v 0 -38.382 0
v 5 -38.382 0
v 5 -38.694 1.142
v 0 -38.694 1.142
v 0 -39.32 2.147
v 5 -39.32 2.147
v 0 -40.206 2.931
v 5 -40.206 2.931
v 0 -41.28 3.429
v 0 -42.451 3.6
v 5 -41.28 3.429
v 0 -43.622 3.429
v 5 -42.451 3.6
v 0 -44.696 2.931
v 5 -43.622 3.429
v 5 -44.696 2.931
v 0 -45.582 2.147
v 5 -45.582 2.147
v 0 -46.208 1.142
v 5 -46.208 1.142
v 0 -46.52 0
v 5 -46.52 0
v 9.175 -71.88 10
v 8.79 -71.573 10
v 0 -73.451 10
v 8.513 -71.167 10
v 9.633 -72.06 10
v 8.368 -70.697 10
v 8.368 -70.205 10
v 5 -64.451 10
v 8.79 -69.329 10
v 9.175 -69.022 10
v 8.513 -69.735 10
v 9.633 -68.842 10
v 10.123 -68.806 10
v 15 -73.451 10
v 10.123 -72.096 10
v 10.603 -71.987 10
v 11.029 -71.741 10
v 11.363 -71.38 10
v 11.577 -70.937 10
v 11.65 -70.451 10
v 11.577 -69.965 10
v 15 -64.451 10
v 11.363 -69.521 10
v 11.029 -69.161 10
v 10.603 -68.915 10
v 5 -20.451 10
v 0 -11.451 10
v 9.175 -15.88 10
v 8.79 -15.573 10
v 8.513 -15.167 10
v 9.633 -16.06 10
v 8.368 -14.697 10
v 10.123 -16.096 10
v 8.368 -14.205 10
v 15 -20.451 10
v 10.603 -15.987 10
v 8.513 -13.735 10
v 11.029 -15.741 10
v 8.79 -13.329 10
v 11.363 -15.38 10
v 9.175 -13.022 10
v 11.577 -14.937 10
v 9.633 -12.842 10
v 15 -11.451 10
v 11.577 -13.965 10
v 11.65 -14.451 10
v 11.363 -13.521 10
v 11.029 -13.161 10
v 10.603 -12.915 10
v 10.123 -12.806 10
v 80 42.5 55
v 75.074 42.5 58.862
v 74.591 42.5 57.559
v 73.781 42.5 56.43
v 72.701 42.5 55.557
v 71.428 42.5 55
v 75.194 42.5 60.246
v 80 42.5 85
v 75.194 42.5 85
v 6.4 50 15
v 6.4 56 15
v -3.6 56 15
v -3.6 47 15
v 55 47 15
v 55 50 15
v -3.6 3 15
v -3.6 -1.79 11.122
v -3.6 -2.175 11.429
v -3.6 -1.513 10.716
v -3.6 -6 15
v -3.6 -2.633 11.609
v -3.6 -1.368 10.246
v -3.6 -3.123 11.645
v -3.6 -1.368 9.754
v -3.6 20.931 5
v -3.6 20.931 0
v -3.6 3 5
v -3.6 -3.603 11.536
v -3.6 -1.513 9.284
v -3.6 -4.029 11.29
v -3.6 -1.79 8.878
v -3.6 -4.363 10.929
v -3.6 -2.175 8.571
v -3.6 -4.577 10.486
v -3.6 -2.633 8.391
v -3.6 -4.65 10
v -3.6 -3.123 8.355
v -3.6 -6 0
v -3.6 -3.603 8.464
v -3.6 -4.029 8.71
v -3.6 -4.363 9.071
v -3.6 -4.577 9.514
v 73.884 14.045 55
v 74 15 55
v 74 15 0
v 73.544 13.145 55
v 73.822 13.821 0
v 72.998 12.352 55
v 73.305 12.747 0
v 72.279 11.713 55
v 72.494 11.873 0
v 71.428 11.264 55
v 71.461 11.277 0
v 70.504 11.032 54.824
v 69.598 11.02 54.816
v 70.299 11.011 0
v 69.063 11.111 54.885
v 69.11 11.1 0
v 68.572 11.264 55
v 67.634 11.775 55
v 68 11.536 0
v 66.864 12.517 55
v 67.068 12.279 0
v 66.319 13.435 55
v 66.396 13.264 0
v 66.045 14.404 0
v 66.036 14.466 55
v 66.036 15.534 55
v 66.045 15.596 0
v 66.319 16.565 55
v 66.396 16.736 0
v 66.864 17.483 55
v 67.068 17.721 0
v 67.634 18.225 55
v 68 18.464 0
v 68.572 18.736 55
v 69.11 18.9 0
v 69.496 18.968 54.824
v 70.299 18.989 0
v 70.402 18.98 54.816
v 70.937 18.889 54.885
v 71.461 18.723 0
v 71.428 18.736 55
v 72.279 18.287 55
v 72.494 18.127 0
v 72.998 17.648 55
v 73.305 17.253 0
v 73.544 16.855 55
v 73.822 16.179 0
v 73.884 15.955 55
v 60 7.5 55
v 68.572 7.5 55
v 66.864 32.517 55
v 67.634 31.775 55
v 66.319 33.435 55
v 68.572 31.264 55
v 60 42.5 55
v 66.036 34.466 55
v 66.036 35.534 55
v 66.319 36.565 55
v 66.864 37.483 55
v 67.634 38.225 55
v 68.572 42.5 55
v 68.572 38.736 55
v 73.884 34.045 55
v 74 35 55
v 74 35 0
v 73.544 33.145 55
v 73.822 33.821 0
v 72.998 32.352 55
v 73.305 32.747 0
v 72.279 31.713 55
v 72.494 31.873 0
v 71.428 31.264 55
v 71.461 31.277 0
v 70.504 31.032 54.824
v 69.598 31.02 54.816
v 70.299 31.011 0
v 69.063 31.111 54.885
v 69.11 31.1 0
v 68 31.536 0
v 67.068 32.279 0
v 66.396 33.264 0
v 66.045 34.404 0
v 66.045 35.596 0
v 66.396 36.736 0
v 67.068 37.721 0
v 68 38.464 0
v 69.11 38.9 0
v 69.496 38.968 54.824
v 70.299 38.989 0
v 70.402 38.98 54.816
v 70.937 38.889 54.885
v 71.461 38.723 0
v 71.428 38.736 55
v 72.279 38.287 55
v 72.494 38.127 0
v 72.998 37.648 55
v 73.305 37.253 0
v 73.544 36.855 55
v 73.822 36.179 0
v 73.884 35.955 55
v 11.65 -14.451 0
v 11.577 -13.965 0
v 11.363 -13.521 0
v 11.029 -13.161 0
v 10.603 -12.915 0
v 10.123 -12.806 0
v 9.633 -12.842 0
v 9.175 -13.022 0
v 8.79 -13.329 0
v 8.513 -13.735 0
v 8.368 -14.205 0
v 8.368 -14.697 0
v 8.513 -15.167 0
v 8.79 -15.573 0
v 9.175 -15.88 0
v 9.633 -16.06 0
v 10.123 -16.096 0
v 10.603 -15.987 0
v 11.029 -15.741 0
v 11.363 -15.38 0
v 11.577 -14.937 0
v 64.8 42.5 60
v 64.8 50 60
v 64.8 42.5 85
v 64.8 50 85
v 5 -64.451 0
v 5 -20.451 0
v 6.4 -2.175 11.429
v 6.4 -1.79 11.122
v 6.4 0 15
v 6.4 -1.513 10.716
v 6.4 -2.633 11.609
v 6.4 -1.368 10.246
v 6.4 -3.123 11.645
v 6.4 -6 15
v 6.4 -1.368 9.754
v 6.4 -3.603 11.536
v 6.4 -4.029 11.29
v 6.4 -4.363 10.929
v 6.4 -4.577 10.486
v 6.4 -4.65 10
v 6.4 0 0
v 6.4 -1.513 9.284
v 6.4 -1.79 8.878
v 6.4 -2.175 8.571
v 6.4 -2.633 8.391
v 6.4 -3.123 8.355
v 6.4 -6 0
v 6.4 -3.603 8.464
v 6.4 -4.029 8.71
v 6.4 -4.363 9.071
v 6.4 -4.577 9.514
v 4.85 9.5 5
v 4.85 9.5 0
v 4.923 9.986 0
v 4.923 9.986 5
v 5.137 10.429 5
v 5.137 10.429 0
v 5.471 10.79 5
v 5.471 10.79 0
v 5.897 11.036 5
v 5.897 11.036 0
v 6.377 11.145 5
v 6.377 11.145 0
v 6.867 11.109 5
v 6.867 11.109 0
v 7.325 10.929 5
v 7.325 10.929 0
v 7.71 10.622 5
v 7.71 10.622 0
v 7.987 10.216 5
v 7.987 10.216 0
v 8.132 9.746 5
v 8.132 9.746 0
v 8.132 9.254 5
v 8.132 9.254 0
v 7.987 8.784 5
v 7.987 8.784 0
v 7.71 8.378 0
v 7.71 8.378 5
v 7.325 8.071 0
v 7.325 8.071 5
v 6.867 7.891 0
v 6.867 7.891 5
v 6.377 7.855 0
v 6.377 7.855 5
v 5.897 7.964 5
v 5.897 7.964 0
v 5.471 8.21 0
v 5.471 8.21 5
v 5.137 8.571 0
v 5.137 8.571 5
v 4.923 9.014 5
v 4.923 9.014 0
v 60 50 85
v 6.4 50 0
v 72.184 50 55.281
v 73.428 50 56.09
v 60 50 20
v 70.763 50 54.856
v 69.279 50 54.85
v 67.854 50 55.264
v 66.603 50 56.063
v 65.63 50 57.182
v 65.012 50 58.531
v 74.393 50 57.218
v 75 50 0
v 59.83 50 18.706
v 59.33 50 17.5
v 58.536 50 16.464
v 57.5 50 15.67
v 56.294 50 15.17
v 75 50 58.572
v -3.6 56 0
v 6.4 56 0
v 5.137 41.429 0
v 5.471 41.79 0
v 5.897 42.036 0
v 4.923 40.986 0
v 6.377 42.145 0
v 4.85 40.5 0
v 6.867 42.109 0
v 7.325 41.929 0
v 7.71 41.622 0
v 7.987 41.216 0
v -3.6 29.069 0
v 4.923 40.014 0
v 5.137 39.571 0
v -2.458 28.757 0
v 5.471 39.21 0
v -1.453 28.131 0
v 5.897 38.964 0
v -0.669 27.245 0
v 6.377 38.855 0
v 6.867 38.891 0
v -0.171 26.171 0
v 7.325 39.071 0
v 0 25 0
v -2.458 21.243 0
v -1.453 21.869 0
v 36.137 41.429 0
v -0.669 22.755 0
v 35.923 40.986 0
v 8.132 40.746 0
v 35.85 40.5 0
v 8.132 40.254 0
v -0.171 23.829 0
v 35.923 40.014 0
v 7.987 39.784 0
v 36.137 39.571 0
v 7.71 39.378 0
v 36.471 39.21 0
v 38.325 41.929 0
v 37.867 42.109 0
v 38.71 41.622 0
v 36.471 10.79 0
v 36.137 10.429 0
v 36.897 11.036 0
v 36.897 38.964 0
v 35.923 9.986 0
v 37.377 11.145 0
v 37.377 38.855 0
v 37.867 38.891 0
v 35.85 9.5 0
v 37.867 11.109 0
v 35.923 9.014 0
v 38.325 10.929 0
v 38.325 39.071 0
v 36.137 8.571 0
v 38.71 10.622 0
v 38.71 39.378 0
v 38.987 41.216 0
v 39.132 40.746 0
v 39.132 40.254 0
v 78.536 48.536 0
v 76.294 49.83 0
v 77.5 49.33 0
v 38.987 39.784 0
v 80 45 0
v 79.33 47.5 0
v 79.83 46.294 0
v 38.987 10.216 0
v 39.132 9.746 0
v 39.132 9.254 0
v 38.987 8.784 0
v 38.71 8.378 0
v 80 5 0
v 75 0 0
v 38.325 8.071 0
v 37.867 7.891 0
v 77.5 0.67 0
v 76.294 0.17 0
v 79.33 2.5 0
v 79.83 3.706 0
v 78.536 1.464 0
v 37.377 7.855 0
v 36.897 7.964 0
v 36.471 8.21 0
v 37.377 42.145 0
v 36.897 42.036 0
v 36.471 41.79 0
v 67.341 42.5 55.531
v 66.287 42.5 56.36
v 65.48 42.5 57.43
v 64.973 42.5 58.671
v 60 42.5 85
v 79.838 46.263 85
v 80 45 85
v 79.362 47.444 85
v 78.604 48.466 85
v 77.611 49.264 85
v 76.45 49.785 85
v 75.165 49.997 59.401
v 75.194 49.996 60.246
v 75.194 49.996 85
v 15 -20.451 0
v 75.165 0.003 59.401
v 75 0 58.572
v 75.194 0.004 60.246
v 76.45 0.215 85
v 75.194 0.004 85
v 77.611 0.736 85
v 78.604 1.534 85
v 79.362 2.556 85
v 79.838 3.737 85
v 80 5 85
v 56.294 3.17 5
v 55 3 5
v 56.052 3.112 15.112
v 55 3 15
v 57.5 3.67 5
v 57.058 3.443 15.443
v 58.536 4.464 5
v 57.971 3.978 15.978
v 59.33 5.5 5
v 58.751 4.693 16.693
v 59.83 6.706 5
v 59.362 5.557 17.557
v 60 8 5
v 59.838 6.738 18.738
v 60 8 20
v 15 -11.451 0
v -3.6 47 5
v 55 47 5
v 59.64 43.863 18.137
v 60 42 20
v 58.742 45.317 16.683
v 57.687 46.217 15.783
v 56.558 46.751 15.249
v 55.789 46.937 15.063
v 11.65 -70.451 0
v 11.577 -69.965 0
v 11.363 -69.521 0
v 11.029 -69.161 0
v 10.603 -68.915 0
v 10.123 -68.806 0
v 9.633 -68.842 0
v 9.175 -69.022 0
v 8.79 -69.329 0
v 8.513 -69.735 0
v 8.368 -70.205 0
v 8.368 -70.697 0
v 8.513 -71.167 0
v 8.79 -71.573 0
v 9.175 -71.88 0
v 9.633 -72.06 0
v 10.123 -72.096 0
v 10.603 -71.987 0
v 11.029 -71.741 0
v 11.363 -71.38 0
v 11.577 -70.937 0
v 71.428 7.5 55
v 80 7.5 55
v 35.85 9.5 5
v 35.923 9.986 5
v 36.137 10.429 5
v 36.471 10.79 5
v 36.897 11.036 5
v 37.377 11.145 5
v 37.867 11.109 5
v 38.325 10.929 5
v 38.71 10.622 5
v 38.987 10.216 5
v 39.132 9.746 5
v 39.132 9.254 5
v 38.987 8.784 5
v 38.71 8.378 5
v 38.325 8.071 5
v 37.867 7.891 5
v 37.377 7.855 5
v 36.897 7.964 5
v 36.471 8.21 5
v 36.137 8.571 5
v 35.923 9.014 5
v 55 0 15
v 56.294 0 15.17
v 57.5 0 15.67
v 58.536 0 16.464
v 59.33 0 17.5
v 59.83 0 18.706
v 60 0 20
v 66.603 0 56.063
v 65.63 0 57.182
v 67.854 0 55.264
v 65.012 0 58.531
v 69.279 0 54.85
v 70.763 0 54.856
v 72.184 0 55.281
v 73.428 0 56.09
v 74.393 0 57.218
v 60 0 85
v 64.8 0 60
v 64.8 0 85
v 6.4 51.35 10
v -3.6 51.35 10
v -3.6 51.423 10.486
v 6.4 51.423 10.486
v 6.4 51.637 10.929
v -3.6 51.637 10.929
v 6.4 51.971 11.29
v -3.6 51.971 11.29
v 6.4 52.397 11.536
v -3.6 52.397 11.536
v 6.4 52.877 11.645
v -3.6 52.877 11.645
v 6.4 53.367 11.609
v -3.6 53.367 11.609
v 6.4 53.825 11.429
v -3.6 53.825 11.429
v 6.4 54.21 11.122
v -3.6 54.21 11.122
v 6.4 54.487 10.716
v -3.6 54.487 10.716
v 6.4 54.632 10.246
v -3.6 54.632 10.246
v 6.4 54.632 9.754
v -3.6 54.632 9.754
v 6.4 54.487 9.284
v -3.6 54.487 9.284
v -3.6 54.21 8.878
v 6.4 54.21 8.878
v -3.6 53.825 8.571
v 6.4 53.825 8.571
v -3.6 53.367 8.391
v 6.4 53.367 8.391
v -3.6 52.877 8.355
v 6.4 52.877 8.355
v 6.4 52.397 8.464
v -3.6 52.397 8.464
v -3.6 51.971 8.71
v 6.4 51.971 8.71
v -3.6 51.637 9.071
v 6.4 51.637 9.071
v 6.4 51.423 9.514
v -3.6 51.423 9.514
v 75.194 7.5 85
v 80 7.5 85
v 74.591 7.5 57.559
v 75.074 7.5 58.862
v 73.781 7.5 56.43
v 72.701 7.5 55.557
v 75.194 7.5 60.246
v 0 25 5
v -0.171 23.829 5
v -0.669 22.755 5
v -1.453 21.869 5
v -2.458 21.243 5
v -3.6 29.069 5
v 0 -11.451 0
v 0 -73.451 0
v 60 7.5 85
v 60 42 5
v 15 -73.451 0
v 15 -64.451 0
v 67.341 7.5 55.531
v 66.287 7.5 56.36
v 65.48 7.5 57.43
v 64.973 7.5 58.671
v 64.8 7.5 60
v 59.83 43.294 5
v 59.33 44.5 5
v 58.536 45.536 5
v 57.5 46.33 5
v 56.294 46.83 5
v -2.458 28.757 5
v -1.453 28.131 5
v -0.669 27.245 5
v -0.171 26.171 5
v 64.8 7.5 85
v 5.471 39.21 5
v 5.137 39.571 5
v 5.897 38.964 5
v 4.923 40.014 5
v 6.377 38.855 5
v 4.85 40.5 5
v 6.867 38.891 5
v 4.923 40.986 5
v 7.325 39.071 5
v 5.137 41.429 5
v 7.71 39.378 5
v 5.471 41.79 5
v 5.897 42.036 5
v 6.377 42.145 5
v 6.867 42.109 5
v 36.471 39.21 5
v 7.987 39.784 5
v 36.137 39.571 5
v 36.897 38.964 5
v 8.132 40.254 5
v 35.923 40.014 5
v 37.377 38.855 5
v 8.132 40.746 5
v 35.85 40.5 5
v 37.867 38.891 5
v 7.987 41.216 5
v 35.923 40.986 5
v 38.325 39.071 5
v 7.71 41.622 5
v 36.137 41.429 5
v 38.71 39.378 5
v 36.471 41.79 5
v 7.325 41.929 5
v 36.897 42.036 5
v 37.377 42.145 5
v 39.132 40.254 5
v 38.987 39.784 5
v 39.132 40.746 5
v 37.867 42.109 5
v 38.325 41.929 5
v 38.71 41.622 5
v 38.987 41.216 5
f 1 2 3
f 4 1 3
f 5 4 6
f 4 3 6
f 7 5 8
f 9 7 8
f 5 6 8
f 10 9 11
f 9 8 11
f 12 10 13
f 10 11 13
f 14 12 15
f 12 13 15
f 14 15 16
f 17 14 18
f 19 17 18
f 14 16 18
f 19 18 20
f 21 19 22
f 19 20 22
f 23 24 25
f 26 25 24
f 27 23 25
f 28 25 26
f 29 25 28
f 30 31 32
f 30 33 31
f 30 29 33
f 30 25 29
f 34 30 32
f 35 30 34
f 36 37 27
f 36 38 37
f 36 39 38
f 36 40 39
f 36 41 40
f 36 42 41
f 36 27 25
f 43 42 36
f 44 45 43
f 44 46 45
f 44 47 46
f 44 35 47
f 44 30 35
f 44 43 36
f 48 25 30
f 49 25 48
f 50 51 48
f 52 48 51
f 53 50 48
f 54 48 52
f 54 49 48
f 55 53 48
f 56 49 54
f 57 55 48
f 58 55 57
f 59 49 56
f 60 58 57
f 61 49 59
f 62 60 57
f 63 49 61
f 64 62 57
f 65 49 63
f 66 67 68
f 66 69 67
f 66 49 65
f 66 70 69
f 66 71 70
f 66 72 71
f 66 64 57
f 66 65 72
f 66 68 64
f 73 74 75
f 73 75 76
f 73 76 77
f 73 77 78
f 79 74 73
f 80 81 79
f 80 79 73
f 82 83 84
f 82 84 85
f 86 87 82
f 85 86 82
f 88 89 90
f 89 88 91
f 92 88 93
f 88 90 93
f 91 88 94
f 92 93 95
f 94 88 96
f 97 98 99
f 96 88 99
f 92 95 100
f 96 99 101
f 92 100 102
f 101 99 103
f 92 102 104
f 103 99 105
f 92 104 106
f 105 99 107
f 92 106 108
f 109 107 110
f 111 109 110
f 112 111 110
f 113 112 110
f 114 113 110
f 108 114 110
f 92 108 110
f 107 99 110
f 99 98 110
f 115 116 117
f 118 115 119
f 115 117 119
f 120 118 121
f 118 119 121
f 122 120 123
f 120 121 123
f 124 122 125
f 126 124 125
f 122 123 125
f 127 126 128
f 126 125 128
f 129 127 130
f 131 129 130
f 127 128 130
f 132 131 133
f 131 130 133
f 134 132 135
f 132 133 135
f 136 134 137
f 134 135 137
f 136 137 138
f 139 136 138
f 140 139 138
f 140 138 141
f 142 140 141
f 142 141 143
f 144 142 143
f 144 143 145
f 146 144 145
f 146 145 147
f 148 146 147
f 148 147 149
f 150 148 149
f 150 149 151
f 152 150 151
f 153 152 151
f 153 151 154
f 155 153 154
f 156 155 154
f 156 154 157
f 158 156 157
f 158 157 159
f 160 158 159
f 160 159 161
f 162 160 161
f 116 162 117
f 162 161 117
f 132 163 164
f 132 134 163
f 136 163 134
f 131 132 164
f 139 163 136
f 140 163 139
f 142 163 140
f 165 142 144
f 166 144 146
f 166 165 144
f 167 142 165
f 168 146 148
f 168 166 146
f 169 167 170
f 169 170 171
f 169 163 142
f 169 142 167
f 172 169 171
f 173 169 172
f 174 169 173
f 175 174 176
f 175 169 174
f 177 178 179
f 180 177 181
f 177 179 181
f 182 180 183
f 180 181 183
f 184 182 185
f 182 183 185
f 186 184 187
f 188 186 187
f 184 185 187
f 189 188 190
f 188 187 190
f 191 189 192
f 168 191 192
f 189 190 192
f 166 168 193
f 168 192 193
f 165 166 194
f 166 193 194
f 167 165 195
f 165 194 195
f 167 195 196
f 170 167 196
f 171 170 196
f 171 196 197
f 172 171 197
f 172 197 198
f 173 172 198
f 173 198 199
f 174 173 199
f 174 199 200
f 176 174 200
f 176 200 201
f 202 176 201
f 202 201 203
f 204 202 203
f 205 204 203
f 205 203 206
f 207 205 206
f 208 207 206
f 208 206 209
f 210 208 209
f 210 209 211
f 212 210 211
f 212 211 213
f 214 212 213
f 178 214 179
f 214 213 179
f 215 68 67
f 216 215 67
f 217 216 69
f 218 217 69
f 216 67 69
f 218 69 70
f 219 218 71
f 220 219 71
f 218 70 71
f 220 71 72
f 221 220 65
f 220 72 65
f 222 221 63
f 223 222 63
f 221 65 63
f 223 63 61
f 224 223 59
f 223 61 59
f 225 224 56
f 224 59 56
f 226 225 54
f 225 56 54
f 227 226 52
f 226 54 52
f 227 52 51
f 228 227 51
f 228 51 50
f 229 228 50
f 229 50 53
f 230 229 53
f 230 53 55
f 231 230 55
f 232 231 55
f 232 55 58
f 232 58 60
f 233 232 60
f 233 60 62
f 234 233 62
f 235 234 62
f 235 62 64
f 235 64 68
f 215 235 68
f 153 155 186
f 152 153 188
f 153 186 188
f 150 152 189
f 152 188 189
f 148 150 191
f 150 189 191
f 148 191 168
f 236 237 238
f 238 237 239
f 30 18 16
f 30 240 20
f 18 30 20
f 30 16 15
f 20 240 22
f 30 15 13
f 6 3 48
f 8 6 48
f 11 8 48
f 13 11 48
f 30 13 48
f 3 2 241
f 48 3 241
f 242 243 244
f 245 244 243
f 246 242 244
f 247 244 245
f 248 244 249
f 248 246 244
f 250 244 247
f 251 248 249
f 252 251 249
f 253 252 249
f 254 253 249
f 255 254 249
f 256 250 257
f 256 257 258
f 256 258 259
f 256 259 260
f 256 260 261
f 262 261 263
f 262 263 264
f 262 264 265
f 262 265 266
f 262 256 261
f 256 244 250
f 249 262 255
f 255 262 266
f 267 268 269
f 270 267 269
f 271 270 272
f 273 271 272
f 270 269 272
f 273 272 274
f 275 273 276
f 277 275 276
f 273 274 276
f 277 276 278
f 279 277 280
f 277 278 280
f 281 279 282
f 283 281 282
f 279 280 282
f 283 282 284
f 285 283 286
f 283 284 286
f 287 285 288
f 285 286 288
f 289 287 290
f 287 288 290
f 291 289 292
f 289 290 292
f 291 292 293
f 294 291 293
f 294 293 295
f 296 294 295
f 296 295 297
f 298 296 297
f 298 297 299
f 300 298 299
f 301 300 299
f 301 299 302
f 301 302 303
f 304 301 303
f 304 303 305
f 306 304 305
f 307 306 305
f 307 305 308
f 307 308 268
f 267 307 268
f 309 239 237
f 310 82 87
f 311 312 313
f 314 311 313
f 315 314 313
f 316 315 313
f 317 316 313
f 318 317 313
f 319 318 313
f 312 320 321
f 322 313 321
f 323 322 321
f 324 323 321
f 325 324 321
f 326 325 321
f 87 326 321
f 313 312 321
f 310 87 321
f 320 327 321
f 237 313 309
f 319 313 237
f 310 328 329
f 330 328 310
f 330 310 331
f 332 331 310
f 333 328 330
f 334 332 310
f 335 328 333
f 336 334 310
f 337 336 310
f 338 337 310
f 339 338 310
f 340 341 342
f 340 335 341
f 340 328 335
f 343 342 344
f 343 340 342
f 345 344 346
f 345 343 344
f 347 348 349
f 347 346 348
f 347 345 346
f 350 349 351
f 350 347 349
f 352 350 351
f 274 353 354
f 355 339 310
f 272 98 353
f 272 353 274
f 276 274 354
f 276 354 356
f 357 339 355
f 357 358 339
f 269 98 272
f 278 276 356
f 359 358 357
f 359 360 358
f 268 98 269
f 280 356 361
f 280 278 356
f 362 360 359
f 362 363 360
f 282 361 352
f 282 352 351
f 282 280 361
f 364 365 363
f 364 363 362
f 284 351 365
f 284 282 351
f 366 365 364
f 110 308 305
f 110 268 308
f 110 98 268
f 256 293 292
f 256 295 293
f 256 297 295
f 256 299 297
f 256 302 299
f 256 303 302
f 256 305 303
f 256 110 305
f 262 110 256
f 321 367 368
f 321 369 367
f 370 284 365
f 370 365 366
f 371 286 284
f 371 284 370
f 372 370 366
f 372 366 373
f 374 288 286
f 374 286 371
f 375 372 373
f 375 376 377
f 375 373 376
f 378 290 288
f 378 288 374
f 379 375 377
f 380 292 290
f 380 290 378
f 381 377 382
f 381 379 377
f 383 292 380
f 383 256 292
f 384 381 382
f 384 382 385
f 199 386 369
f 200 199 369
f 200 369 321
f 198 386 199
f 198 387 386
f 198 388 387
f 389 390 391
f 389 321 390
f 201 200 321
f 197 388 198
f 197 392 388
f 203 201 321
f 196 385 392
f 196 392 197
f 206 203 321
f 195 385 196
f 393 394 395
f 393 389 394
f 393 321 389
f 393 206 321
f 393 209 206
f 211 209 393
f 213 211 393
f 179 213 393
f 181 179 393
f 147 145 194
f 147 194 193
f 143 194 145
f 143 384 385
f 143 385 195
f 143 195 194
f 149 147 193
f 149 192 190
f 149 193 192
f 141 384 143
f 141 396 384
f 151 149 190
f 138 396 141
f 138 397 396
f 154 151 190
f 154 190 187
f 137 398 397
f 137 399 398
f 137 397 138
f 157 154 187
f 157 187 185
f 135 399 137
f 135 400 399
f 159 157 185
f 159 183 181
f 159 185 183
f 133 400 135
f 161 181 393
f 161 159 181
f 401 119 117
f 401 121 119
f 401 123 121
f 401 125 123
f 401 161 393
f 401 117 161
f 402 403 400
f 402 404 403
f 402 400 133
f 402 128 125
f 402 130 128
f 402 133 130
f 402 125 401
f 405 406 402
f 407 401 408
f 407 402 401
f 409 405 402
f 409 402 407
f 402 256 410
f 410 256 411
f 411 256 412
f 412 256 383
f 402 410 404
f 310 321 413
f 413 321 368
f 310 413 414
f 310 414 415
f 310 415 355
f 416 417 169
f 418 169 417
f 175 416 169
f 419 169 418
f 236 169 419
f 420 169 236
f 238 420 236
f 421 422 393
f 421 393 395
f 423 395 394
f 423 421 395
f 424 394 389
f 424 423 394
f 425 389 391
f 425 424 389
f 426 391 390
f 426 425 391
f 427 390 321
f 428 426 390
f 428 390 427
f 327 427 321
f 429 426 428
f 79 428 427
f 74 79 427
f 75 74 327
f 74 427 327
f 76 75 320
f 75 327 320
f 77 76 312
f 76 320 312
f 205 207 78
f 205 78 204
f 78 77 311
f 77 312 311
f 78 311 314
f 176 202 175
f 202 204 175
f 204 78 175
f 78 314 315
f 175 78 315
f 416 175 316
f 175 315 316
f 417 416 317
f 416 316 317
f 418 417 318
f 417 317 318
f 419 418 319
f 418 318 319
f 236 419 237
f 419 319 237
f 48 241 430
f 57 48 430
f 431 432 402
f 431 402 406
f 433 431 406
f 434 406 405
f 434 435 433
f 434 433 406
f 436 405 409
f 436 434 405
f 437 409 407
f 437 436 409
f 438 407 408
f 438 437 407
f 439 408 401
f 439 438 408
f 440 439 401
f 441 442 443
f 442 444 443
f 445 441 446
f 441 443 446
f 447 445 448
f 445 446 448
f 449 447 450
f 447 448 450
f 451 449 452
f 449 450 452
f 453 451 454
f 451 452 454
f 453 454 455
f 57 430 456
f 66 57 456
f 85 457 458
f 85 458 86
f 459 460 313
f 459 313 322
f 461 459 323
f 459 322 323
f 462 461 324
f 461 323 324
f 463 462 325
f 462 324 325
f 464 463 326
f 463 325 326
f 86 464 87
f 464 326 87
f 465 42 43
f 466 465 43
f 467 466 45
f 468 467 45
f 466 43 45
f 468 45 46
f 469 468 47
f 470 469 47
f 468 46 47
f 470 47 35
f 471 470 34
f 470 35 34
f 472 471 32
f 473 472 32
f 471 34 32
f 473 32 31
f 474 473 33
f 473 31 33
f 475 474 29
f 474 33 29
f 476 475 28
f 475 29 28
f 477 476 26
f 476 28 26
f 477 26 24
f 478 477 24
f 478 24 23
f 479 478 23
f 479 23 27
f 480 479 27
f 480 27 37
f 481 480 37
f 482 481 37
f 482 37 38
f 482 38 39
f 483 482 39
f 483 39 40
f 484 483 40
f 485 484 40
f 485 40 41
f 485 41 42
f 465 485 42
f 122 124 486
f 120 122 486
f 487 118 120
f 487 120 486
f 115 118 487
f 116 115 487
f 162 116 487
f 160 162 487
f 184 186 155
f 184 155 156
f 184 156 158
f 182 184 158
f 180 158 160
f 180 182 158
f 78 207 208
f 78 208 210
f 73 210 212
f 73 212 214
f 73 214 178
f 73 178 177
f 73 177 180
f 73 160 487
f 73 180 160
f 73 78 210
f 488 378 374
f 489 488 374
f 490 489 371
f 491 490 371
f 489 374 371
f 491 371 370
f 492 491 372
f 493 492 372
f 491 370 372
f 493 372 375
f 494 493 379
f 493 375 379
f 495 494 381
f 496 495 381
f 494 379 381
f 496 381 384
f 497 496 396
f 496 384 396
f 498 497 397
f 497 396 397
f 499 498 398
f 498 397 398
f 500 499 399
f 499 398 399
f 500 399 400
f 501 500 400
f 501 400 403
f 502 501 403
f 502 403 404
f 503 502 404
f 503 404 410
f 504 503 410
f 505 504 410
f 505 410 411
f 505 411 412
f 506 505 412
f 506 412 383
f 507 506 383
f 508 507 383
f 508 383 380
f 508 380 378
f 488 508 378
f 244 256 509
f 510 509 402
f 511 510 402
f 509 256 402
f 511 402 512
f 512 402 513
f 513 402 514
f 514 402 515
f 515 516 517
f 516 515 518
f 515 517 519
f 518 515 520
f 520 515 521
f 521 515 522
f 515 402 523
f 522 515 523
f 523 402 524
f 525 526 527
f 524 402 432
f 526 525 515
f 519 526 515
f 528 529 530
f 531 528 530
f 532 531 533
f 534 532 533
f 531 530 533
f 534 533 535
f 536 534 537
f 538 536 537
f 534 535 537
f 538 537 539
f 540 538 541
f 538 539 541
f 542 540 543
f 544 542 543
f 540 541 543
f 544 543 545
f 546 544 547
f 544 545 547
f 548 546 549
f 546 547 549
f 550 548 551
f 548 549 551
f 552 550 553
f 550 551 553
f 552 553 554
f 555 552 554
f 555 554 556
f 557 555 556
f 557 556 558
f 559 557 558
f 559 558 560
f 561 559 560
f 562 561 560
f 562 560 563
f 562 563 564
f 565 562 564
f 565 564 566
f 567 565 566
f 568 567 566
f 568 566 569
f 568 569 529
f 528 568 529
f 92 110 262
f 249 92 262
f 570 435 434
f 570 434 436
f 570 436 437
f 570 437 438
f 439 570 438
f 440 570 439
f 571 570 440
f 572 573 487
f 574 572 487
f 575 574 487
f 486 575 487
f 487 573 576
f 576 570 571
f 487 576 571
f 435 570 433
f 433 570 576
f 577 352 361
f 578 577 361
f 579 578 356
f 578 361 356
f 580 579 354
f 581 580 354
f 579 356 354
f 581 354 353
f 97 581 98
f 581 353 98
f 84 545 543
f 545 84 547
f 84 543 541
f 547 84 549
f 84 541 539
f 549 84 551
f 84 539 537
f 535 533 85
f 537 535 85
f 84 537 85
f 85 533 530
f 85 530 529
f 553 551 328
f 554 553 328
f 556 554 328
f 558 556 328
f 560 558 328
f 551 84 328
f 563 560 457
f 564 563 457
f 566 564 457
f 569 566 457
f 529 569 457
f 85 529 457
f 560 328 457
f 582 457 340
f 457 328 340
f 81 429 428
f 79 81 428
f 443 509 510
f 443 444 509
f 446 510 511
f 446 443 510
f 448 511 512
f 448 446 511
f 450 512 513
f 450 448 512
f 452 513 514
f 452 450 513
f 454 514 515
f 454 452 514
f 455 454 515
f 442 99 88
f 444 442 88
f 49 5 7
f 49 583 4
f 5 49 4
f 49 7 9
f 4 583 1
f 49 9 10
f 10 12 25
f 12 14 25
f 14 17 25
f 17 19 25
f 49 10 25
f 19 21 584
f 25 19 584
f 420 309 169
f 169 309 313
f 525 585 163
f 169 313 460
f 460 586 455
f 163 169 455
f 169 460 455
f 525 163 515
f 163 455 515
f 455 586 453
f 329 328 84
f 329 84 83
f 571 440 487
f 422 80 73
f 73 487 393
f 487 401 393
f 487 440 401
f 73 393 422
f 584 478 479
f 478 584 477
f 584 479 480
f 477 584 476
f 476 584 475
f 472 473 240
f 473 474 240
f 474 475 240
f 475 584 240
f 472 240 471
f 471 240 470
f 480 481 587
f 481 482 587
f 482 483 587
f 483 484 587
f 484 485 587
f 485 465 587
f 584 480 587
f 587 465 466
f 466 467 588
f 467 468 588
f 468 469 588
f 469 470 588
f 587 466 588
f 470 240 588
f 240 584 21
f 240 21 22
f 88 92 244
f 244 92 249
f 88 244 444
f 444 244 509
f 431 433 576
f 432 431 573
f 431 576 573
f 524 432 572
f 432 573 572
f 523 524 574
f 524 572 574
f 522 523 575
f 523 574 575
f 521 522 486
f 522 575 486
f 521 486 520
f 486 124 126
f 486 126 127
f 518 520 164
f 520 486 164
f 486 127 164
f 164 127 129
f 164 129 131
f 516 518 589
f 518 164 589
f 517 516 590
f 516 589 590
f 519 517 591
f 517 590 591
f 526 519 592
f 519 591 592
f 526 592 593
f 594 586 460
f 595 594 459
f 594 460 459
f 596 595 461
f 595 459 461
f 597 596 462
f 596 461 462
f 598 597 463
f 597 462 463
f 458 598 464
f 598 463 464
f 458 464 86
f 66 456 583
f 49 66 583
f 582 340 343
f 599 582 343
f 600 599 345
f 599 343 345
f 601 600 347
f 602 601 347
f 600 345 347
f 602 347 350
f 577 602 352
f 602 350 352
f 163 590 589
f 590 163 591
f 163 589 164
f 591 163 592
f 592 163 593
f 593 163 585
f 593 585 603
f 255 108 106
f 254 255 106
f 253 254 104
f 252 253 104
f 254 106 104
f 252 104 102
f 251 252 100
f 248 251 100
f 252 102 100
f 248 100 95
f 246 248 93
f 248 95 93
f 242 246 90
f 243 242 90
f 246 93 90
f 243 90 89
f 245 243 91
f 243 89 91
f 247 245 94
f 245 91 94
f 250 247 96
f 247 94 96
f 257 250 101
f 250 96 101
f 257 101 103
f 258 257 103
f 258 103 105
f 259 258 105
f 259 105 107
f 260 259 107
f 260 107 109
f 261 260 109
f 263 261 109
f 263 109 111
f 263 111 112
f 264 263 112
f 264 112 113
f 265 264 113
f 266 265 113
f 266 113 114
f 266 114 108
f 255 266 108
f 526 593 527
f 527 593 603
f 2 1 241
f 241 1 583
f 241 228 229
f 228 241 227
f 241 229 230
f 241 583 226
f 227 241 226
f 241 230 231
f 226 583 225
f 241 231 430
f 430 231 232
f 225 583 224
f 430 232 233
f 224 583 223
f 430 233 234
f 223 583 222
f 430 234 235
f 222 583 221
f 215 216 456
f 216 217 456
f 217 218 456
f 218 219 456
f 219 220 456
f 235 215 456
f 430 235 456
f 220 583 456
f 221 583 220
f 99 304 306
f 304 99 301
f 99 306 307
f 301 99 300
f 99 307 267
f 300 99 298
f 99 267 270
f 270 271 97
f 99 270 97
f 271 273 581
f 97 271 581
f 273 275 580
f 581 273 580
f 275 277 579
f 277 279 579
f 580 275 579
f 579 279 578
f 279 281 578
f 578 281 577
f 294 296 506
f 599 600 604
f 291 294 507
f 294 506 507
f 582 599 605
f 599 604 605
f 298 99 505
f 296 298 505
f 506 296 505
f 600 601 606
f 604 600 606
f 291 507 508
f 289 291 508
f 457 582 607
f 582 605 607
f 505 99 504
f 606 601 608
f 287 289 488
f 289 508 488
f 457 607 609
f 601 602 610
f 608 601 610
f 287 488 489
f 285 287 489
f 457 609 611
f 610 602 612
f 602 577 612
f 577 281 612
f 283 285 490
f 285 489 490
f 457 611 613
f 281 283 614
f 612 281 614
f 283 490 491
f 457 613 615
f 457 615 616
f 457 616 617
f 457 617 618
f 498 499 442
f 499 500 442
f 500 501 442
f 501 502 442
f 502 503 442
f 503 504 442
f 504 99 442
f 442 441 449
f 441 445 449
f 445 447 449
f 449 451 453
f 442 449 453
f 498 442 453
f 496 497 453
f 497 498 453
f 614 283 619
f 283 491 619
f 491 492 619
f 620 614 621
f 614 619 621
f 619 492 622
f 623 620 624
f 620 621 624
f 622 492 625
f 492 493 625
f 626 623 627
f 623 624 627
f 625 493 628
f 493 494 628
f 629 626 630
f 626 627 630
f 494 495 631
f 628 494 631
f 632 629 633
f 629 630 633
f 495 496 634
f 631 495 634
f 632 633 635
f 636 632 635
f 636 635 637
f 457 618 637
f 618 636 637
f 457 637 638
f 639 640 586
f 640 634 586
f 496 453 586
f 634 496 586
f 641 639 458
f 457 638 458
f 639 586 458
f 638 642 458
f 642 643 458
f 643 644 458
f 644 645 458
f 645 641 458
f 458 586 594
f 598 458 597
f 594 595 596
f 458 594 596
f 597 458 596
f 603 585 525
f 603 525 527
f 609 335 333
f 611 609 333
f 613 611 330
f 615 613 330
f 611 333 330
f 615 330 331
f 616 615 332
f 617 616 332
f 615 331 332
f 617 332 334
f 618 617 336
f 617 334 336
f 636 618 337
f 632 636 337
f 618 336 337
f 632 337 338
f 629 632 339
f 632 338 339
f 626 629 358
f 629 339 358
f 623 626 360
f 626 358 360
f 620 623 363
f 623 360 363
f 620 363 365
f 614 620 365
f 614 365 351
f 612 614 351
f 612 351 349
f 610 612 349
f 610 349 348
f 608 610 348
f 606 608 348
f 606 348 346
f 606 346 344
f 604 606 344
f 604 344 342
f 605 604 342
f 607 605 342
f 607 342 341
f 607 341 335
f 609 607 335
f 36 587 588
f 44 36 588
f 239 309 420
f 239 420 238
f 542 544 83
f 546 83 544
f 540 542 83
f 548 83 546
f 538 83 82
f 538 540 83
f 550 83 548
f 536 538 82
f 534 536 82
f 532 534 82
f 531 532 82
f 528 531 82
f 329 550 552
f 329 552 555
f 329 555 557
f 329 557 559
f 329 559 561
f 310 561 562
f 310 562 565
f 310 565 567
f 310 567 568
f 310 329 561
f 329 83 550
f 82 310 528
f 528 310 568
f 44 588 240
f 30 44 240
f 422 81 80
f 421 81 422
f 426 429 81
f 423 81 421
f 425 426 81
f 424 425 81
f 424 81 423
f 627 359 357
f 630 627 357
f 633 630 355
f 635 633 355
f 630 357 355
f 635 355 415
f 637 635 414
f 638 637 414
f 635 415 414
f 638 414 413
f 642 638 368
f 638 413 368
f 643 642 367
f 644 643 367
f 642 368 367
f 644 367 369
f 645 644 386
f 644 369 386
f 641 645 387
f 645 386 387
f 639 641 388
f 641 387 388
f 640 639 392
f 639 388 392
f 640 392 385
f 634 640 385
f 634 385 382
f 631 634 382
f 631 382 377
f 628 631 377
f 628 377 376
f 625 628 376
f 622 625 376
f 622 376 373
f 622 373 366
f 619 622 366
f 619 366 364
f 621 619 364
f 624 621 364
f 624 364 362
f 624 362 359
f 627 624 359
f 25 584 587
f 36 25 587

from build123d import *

# Parameters (mm, degrees)
F0_W      = 80
F0_H      = 50
F1_DEPTH  = 5
F3_DEPTH  = 10
F2_W      = 17
F2_H      = 44
F4_DEPTH  = 80
F5_D      = 3.3
F6_DEPTH  = 3.6
F8_DEPTH  = 25
F7_W      = 10
F7_H      = 6
F9_DEPTH  = 15
F10_R     = 1.65
F11_DEPTH = 25
F13_DEPTH = 10
F15_DEPTH = 25
F16_R     = 1.65
F17_DEPTH = 25
F19_W     = 20
F19_H     = 35
F20_DEPTH = 30
F21_DEPTH = 80
F22_R     = 4
F23_DEPTH = 60
F24_R     = 5


with BuildPart() as f1:
    # F0 (on Top) → F1 (new body)
    with BuildSketch(Plane.XY):
        with Locations((40, 25)):
            Rectangle(F0_W, F0_H)
    extrude(amount=F1_DEPTH)

    # F2 (on face) → F3 (join)
    with BuildSketch(Plane.XY.offset(5)):
        Polygon((0, 47), (3, 47), (60, 47), (60, 50), (0, 50), align=None)
        Polygon((60, 0), (60, 3), (3, 3), (0, 3), (0, 0), align=None)
    extrude(amount=F3_DEPTH)

    # F2 (on face) → F4 (join)
    with BuildSketch(Plane.XY.offset(5)):
        with Locations((68.5, 25)):
            Rectangle(F2_W, F2_H)
        Polygon((60, 50), (60, 47), (77, 47), (77, 3), (60, 3), (60, 0), (80, 0), (80, 50), align=None)
    extrude(amount=F4_DEPTH)

    # F5 (through all)
    with Locations(Plane.XY.offset(5)):
        with Locations((37.5, 40.5), (37.5, 9.5), (6.5, 9.5), (6.5, 40.5)):
            Hole(F5_D / 2)

    # F6 (add): a face of the model
    f6_faces = [f1.faces().sort_by_distance(p)[0] for p in [
        (0, 25, 3.9516129032),
    ]]
    extrude(f6_faces, amount=F6_DEPTH)

    # F7 (on face) → F8 (cut)
    with BuildSketch(Plane(origin=(0, 0, 0), x_dir=(1, 0, 0), z_dir=(0, 0, -1))):
        with BuildLine():
            ThreePointArc((-3.6, -29.0693979899), (-1.0291694934, -27.7166155414), (0, -25))
            ThreePointArc((0, -25), (-1.0291694934, -22.2833844586), (-3.6, -20.9306020101))
            Line((-3.6, -20.9306020101), (-3.6, -25))
            Line((-3.6, -25), (-3.6, -29.0693979899))
        make_face()
    extrude(amount=-F8_DEPTH, mode=Mode.SUBTRACT)

    # F7 (on face) → F9 (join)
    with BuildSketch(Plane(origin=(0, 0, 0), x_dir=(1, 0, 0), z_dir=(0, 0, -1))):
        with Locations((1.4, 3)):
            Rectangle(F7_W, F7_H)
        with Locations((1.4, -53)):
            Rectangle(F7_W, F7_H)
    extrude(amount=-F9_DEPTH)

    # F10 (on face) → F11 (cut)
    with BuildSketch(Plane(origin=(-3.6, 0, 0), x_dir=(0, -1, 0), z_dir=(-1, 0, 0))):
        with Locations((3, 10)):
            Circle(F10_R)
        with Locations((-53, 10)):
            Circle(F10_R)
    extrude(amount=-F11_DEPTH, mode=Mode.SUBTRACT)

    # F19 (on face) → F20 (cut)
    with BuildSketch(Plane.XY.offset(85)):
        with Locations((70, 25)):
            Rectangle(F19_W, F19_H)
    extrude(amount=-F20_DEPTH, mode=Mode.SUBTRACT)

    # F18 (on face) → F21 (cut)
    with BuildSketch(Plane(origin=(0, 50, 0), x_dir=(-1, 0, 0), z_dir=(0, 1, 0))):
        with BuildLine():
            ThreePointArc((-75.1941809589, 60.2459352893), (-70.1230020607, 54.8014549638), (-64.8, 60))
            ThreePointArc((-64.8, 60), (-69.8769979393, 65.1985450362), (-75.1941809589, 60.2459352893))
        make_face()
        with BuildLine():
            ThreePointArc((-75.1941809589, 60.2459352893), (-69.8769979393, 65.1985450362), (-64.8, 60))
            Line((-64.8, 60), (-64.8, 85))
            Line((-64.8, 85), (-75.1941809589, 85))
            Line((-75.1941809589, 85), (-75.1941809589, 60.2459352893))
        make_face()
    extrude(amount=-F21_DEPTH, mode=Mode.SUBTRACT)

    # F22 (on face) → F23 (cut)
    with BuildSketch(Plane(origin=(0, 0, 0), x_dir=(1, 0, 0), z_dir=(0, 0, -1))):
        with Locations((70, -15)):
            Circle(F22_R)
        with Locations((70, -35)):
            Circle(F22_R)
    extrude(amount=-F23_DEPTH, mode=Mode.SUBTRACT)

    # F24
    f24_edges = [f1.edges().sort_by_distance(p)[0] for p in [
        (80, 50, 42.5),
        (80, 0, 42.5),
        (60, 47, 10),
        (60, 3, 10),
        (60, 1.5, 15),
        (60, 48.5, 15),
    ]]
    fillet(f24_edges, radius=F24_R)


with BuildPart() as f13:
    # F12 (on Top) → F13 (new body)
    with BuildSketch(Plane.XY):
        Polygon((15, -11.4509467413), (0, -11.4509467413), (0, -73.4509467413), (15, -73.4509467413), (15, -64.4509467413), (5, -64.4509467413), (5, -42.4509467413), (5, -20.4509467413), (15, -20.4509467413), align=None)
    extrude(amount=F13_DEPTH)

    # F14 (on face) → F15 (cut)
    with BuildSketch(Plane.YZ.offset(5)):
        with BuildLine():
            Line((-46.5203447312, 0), (-38.3815487515, 0))
            ThreePointArc((-38.3815487515, 0), (-42.4509467413, 3.6), (-46.5203447312, 0))
        make_face()
    extrude(amount=-F15_DEPTH, mode=Mode.SUBTRACT)

    # F16 (on face) → F17 (cut)
    with BuildSketch(Plane.XY.offset(10)):
        with Locations((10, -14.4509467413)):
            Circle(F16_R)
        with Locations((10, -70.4509467413)):
            Circle(F16_R)
    extrude(amount=-F17_DEPTH, mode=Mode.SUBTRACT)


solid = Compound([f1.part, f13.part])
